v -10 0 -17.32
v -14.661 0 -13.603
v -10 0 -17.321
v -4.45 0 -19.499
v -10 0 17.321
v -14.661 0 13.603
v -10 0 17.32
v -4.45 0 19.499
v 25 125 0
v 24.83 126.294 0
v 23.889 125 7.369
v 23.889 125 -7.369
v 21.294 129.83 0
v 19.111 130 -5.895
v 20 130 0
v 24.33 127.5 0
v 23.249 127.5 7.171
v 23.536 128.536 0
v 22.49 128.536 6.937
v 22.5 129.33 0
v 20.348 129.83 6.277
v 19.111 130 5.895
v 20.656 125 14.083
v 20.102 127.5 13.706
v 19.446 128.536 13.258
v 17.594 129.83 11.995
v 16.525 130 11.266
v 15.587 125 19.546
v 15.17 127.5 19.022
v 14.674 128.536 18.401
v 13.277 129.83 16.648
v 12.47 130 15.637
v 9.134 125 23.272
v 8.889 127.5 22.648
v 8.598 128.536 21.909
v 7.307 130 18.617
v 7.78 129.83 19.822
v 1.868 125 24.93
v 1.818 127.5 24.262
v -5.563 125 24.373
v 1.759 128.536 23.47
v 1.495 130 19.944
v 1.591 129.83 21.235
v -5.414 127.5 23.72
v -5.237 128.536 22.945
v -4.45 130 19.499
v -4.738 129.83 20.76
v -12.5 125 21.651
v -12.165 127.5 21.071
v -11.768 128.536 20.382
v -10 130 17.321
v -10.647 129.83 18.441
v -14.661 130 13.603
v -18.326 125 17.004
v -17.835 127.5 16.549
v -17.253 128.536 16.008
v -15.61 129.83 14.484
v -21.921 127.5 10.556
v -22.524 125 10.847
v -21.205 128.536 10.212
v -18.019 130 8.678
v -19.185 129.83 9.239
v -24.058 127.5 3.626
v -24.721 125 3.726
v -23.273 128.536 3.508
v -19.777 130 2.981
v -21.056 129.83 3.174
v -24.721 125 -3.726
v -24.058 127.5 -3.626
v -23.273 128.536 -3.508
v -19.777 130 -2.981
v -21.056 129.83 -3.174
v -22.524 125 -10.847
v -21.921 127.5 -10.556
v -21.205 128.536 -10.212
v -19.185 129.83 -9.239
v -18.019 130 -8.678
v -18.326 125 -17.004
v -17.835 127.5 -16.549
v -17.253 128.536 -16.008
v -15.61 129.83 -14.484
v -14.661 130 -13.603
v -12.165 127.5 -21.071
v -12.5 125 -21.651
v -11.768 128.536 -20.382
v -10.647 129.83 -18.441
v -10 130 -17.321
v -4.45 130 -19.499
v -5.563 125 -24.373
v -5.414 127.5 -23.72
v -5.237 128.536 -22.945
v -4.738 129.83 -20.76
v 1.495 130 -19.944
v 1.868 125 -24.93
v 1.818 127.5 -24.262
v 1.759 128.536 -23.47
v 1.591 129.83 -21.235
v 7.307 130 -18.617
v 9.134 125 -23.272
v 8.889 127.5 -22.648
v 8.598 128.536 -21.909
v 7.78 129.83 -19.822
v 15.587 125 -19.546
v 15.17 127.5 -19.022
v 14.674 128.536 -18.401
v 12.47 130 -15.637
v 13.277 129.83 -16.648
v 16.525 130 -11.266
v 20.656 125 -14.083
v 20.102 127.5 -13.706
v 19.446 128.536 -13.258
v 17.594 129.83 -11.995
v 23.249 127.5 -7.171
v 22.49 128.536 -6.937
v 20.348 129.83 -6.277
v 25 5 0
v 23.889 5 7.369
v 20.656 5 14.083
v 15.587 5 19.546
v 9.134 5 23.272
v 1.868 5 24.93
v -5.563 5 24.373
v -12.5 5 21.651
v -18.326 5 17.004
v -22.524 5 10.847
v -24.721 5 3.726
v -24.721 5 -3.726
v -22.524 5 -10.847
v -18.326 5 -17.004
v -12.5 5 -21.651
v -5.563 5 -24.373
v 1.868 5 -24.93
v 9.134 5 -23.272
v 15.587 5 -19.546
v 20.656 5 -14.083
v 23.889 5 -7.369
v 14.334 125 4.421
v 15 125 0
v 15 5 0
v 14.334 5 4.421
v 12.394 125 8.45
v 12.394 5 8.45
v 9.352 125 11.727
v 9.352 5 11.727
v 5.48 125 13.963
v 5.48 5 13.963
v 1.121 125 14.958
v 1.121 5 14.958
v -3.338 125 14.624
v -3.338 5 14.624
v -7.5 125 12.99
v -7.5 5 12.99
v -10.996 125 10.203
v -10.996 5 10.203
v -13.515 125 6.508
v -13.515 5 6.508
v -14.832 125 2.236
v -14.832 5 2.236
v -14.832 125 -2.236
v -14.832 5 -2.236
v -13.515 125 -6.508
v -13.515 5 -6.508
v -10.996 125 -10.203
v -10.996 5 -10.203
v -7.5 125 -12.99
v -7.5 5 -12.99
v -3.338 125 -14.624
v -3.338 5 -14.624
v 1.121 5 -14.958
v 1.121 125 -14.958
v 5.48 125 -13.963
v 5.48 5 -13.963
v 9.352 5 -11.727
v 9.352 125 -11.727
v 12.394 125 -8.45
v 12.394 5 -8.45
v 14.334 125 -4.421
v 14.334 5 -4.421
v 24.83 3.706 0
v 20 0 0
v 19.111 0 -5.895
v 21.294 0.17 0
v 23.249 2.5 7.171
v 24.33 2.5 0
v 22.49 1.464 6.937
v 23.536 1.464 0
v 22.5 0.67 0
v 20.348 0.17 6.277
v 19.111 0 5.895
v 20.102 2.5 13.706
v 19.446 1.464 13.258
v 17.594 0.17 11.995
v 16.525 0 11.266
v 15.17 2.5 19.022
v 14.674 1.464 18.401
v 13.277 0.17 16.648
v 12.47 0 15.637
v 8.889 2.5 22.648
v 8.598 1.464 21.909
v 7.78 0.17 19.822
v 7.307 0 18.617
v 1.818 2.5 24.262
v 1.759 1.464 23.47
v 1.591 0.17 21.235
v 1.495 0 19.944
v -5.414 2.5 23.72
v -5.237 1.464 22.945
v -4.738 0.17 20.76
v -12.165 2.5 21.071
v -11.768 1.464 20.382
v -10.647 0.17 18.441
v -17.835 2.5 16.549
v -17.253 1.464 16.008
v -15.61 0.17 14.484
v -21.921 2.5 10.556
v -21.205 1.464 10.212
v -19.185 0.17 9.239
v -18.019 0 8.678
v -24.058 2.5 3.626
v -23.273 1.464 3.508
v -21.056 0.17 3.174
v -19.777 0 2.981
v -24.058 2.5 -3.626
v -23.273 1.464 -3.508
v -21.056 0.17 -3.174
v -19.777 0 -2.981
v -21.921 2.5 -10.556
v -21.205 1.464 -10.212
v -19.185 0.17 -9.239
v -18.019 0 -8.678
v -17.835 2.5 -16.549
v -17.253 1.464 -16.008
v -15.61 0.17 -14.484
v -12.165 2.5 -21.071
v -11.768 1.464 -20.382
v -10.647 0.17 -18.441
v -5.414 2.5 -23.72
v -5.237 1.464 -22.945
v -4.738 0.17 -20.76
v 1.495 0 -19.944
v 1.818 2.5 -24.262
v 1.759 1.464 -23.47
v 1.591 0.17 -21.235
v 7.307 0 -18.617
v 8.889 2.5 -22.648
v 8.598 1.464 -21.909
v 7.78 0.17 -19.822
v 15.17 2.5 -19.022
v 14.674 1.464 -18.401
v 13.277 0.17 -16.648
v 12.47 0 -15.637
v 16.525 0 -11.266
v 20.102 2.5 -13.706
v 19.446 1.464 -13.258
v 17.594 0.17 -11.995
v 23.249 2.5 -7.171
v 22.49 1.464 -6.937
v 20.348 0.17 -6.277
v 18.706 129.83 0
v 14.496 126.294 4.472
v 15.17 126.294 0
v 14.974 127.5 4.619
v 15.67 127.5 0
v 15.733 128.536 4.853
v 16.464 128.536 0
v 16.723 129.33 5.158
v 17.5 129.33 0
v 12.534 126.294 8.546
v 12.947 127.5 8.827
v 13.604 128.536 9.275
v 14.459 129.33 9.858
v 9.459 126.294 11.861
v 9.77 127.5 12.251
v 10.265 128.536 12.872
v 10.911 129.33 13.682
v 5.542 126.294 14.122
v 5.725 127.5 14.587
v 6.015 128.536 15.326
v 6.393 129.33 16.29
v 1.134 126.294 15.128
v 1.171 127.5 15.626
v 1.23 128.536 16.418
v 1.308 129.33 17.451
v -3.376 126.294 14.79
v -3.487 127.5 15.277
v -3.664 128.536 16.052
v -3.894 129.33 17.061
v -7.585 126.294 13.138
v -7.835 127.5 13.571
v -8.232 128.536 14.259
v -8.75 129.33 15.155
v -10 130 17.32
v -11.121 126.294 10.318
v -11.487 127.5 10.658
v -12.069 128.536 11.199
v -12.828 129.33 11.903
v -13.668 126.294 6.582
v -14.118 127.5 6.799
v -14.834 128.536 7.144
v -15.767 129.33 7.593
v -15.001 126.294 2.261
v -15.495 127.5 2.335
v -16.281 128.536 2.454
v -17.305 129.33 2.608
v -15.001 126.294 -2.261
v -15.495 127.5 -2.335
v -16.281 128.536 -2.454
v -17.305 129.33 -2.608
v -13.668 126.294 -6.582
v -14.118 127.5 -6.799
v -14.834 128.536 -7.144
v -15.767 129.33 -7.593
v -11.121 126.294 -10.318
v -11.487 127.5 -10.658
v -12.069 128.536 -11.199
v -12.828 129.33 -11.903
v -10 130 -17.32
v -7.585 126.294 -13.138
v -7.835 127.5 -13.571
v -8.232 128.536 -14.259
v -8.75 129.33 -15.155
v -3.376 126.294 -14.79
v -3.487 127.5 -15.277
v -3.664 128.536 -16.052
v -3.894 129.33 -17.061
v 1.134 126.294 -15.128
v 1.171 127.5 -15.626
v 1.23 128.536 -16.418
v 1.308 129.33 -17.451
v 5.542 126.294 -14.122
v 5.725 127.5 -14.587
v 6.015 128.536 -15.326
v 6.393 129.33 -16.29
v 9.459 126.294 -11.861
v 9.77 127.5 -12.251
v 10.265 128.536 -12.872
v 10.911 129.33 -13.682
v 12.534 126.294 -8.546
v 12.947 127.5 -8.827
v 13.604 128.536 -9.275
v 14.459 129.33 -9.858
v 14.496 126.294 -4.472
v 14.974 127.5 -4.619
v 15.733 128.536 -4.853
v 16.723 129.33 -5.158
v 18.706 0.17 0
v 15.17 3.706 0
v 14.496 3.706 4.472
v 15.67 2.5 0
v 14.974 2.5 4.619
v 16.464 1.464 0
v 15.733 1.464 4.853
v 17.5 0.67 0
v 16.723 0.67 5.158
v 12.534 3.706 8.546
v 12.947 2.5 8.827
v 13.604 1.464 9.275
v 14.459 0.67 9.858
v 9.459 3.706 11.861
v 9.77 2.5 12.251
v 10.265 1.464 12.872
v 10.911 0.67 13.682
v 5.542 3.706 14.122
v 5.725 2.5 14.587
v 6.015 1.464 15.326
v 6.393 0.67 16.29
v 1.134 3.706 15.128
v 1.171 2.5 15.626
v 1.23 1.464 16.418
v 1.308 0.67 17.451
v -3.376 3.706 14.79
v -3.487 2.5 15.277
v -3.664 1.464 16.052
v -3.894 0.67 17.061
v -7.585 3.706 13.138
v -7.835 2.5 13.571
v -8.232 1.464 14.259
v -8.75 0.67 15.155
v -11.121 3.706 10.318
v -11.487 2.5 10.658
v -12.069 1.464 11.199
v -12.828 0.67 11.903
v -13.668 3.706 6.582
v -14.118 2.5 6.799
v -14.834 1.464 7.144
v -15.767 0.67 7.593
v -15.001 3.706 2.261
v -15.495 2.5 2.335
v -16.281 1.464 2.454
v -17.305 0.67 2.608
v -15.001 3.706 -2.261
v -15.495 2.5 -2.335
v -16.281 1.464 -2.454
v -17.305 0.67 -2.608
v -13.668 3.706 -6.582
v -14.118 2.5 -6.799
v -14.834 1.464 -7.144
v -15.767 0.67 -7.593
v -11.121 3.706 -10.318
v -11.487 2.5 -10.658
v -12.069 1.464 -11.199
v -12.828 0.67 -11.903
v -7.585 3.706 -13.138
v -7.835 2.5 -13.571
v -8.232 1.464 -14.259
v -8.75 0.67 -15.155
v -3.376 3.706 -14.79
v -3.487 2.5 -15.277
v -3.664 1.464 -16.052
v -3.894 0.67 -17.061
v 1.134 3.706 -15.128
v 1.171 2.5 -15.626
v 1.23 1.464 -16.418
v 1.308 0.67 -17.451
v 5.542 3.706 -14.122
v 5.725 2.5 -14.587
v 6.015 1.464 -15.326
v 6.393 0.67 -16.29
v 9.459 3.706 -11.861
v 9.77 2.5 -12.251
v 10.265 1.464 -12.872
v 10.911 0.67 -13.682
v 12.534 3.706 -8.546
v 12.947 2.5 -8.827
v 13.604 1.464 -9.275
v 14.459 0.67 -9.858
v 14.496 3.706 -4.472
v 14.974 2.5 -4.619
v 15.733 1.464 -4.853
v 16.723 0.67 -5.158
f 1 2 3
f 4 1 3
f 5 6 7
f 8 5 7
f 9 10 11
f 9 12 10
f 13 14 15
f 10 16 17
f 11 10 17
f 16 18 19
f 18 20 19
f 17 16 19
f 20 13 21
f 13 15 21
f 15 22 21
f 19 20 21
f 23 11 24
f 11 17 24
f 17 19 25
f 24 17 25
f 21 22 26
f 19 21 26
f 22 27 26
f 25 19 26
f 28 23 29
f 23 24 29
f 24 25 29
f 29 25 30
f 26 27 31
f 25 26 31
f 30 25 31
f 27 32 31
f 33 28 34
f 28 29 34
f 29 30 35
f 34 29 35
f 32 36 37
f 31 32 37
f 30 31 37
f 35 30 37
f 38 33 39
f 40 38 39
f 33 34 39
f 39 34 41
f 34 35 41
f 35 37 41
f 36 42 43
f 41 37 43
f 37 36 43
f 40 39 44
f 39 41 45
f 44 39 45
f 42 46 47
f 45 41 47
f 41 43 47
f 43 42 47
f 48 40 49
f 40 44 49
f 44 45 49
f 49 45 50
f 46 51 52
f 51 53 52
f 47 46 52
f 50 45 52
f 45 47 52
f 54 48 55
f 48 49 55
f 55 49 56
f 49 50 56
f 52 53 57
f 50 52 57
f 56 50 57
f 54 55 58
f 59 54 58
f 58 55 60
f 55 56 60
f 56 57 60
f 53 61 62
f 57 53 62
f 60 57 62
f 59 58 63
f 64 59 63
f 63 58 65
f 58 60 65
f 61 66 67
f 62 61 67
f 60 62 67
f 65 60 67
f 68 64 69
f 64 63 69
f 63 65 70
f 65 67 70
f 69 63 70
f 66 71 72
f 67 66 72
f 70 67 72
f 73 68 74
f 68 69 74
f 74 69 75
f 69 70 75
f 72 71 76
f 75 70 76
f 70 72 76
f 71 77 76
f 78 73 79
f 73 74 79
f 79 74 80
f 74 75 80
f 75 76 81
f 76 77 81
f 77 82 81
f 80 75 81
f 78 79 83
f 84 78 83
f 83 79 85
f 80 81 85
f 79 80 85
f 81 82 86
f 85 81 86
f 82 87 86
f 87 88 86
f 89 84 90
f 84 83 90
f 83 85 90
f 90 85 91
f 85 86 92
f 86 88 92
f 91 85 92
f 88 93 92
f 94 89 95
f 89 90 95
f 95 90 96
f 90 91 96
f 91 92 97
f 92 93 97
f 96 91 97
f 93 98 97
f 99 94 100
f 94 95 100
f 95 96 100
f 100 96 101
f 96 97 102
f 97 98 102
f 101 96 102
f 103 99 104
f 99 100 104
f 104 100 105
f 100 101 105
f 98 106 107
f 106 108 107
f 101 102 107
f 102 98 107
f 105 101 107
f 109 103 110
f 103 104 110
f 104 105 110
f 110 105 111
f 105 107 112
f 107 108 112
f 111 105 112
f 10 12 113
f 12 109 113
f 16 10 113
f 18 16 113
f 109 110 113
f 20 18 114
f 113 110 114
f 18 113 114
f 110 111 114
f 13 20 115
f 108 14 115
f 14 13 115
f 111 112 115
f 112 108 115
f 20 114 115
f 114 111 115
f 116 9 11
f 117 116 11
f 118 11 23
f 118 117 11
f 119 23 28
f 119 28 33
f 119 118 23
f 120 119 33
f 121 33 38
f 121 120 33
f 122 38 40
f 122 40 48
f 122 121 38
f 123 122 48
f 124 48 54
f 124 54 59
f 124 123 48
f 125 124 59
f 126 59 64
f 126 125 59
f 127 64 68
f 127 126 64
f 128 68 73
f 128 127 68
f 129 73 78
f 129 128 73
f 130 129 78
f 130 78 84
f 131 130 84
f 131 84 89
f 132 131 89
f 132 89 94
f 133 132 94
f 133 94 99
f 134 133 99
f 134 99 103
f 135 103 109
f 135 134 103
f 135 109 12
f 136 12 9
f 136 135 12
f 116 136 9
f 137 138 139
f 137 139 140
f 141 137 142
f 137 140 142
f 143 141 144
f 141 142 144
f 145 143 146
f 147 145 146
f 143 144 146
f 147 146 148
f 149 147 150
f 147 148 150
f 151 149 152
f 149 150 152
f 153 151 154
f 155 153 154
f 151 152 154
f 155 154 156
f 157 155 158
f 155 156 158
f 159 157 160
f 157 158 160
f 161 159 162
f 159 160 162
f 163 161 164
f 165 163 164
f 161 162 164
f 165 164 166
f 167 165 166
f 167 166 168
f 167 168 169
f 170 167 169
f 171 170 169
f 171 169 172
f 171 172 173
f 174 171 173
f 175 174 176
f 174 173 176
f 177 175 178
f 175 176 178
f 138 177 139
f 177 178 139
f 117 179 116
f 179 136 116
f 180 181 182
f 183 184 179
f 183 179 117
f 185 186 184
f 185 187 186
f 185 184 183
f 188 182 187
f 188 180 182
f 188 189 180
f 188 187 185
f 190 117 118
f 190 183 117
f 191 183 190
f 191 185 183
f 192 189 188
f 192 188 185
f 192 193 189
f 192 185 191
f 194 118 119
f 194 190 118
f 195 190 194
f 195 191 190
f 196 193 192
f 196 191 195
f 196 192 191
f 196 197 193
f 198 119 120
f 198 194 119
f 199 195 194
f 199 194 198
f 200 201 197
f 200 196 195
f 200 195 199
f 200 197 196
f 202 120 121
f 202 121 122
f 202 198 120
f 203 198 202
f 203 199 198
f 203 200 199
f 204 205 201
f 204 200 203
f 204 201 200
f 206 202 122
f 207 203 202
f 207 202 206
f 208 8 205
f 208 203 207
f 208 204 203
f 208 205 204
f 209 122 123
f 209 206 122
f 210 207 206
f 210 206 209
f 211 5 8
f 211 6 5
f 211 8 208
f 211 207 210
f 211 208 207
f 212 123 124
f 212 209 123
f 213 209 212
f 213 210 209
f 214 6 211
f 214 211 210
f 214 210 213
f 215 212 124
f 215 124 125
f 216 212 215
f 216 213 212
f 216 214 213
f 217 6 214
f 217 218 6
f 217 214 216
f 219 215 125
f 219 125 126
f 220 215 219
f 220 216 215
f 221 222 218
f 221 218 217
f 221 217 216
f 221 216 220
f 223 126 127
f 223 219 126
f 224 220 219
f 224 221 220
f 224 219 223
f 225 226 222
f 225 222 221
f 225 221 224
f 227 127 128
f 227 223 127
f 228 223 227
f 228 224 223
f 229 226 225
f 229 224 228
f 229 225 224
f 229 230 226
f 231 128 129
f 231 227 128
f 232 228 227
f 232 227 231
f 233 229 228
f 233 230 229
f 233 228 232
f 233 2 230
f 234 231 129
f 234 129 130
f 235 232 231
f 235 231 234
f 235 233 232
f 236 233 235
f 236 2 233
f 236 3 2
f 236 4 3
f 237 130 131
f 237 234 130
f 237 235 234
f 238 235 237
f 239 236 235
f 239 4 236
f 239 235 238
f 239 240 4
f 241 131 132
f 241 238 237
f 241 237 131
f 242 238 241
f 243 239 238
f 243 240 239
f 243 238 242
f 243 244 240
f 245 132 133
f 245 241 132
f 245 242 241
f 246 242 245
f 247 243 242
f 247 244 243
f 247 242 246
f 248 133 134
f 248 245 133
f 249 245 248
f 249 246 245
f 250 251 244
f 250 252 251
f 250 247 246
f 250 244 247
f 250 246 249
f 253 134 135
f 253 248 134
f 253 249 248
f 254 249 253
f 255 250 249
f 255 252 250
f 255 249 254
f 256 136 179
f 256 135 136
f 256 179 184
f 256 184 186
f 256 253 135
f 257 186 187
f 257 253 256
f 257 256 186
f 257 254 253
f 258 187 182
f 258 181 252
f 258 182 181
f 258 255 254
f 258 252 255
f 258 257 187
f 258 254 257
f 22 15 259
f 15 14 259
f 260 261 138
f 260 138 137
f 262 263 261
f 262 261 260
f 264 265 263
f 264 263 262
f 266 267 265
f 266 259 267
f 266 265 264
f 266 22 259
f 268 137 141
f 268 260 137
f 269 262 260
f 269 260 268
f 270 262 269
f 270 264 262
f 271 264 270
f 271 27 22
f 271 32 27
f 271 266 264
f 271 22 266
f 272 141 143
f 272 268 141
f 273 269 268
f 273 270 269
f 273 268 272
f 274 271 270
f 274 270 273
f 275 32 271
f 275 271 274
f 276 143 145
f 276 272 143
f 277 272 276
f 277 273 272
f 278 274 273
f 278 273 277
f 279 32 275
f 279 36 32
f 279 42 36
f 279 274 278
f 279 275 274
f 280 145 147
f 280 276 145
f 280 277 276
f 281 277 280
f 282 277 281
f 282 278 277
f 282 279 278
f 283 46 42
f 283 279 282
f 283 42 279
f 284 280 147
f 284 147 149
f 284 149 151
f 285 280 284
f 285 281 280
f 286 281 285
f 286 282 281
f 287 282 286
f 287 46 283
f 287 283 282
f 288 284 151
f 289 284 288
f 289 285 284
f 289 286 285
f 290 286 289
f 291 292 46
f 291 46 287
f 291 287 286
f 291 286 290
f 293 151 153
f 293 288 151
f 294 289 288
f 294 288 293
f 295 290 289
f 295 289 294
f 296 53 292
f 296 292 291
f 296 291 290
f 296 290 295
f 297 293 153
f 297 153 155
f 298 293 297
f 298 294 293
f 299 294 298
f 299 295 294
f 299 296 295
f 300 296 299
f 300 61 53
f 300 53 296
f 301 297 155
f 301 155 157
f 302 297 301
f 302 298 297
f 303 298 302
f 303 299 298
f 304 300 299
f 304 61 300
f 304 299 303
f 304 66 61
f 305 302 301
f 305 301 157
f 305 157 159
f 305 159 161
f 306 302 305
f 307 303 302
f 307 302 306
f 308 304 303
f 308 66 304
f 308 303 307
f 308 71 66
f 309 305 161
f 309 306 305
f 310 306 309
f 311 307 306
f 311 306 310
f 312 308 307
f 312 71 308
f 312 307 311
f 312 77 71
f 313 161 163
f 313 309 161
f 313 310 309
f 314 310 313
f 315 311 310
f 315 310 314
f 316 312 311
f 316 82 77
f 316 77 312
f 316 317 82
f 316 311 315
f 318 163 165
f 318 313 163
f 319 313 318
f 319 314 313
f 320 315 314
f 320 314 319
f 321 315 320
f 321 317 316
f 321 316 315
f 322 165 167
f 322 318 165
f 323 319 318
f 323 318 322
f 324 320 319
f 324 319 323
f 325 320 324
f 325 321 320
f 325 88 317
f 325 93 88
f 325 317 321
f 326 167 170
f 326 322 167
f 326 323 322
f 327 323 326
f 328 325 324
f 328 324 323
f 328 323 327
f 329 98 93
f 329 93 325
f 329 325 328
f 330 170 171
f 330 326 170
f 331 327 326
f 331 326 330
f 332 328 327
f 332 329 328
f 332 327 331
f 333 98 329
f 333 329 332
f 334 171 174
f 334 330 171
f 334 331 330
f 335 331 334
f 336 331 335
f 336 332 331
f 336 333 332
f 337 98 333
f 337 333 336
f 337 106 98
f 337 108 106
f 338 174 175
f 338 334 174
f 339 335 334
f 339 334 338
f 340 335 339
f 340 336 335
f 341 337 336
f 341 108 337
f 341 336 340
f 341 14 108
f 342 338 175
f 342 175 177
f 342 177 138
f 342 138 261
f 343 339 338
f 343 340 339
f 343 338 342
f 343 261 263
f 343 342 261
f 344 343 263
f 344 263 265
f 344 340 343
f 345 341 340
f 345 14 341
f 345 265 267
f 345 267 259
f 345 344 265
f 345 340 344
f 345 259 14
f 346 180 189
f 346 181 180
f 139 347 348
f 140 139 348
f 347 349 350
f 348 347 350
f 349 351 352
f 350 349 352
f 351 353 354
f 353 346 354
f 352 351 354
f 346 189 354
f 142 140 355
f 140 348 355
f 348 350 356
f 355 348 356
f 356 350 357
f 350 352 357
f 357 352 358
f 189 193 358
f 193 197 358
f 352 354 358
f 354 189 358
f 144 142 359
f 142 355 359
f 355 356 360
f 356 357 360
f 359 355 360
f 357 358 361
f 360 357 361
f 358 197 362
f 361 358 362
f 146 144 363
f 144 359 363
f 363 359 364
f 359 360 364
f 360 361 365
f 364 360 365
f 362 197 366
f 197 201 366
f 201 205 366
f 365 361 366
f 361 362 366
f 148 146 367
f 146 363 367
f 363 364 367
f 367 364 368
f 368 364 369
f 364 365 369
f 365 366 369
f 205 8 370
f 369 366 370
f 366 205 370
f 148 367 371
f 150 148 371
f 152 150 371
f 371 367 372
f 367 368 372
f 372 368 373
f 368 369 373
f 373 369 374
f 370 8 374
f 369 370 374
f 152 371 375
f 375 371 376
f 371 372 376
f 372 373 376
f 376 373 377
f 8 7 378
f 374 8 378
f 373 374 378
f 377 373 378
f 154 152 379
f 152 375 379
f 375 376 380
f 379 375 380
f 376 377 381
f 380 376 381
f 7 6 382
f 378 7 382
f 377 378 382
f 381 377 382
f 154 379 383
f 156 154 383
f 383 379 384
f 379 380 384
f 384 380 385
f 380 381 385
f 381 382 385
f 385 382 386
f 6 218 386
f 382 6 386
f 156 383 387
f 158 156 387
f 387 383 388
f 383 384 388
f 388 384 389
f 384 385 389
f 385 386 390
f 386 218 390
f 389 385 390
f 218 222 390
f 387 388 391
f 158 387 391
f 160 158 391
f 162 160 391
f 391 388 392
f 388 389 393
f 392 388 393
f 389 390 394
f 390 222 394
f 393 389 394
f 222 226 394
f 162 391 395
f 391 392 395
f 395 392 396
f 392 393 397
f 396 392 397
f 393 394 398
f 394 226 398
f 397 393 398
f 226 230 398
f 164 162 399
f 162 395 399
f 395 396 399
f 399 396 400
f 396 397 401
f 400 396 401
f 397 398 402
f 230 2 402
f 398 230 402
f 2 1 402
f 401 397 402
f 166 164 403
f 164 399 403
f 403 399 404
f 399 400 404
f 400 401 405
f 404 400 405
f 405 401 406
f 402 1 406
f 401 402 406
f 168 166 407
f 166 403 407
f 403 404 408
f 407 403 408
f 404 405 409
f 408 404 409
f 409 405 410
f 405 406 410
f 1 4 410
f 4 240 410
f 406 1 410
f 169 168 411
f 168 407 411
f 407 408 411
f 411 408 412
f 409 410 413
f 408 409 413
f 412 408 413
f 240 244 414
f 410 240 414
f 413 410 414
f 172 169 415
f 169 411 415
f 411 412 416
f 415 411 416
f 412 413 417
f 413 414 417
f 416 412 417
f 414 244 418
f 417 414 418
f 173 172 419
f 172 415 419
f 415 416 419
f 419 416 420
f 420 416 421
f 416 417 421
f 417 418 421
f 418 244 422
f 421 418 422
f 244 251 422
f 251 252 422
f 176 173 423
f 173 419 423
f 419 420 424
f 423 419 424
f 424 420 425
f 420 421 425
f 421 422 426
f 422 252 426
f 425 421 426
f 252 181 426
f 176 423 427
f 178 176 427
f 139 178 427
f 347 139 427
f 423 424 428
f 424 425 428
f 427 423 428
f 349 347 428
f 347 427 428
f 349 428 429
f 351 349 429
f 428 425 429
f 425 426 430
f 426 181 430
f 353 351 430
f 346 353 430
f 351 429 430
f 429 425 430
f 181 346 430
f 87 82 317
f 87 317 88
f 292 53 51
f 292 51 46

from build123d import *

# Parameters (mm, degrees)
F0_R     = 25
F0_R_2   = 15
F1_DEPTH = 130
F2_R     = 4.99999


# Not quite as in the source:
# - a fillet or chamfer is up to 0.001 mm smaller than in the source, because OpenCascade refuses the exact size


with BuildPart() as f1:
    # F0 (on Front) → F1 (new body)
    with BuildSketch(Plane.XZ):
        Circle(F0_R)
        Circle(F0_R_2, mode=Mode.SUBTRACT)
    extrude(amount=-F1_DEPTH)

    # F2 (radius 5 in the source; OpenCascade refuses exactly that, so slightly less here)
    f2_edges = [f1.edges().sort_by_distance(p)[0] for p in [
        (-15, 0, 0),
        (-25, 0, 0),
        (25, 65, 0),
        (-25, 130, 0),
        (-15, 130, 0),
    ]]
    fillet(f2_edges, radius=F2_R)


solid = f1.part
